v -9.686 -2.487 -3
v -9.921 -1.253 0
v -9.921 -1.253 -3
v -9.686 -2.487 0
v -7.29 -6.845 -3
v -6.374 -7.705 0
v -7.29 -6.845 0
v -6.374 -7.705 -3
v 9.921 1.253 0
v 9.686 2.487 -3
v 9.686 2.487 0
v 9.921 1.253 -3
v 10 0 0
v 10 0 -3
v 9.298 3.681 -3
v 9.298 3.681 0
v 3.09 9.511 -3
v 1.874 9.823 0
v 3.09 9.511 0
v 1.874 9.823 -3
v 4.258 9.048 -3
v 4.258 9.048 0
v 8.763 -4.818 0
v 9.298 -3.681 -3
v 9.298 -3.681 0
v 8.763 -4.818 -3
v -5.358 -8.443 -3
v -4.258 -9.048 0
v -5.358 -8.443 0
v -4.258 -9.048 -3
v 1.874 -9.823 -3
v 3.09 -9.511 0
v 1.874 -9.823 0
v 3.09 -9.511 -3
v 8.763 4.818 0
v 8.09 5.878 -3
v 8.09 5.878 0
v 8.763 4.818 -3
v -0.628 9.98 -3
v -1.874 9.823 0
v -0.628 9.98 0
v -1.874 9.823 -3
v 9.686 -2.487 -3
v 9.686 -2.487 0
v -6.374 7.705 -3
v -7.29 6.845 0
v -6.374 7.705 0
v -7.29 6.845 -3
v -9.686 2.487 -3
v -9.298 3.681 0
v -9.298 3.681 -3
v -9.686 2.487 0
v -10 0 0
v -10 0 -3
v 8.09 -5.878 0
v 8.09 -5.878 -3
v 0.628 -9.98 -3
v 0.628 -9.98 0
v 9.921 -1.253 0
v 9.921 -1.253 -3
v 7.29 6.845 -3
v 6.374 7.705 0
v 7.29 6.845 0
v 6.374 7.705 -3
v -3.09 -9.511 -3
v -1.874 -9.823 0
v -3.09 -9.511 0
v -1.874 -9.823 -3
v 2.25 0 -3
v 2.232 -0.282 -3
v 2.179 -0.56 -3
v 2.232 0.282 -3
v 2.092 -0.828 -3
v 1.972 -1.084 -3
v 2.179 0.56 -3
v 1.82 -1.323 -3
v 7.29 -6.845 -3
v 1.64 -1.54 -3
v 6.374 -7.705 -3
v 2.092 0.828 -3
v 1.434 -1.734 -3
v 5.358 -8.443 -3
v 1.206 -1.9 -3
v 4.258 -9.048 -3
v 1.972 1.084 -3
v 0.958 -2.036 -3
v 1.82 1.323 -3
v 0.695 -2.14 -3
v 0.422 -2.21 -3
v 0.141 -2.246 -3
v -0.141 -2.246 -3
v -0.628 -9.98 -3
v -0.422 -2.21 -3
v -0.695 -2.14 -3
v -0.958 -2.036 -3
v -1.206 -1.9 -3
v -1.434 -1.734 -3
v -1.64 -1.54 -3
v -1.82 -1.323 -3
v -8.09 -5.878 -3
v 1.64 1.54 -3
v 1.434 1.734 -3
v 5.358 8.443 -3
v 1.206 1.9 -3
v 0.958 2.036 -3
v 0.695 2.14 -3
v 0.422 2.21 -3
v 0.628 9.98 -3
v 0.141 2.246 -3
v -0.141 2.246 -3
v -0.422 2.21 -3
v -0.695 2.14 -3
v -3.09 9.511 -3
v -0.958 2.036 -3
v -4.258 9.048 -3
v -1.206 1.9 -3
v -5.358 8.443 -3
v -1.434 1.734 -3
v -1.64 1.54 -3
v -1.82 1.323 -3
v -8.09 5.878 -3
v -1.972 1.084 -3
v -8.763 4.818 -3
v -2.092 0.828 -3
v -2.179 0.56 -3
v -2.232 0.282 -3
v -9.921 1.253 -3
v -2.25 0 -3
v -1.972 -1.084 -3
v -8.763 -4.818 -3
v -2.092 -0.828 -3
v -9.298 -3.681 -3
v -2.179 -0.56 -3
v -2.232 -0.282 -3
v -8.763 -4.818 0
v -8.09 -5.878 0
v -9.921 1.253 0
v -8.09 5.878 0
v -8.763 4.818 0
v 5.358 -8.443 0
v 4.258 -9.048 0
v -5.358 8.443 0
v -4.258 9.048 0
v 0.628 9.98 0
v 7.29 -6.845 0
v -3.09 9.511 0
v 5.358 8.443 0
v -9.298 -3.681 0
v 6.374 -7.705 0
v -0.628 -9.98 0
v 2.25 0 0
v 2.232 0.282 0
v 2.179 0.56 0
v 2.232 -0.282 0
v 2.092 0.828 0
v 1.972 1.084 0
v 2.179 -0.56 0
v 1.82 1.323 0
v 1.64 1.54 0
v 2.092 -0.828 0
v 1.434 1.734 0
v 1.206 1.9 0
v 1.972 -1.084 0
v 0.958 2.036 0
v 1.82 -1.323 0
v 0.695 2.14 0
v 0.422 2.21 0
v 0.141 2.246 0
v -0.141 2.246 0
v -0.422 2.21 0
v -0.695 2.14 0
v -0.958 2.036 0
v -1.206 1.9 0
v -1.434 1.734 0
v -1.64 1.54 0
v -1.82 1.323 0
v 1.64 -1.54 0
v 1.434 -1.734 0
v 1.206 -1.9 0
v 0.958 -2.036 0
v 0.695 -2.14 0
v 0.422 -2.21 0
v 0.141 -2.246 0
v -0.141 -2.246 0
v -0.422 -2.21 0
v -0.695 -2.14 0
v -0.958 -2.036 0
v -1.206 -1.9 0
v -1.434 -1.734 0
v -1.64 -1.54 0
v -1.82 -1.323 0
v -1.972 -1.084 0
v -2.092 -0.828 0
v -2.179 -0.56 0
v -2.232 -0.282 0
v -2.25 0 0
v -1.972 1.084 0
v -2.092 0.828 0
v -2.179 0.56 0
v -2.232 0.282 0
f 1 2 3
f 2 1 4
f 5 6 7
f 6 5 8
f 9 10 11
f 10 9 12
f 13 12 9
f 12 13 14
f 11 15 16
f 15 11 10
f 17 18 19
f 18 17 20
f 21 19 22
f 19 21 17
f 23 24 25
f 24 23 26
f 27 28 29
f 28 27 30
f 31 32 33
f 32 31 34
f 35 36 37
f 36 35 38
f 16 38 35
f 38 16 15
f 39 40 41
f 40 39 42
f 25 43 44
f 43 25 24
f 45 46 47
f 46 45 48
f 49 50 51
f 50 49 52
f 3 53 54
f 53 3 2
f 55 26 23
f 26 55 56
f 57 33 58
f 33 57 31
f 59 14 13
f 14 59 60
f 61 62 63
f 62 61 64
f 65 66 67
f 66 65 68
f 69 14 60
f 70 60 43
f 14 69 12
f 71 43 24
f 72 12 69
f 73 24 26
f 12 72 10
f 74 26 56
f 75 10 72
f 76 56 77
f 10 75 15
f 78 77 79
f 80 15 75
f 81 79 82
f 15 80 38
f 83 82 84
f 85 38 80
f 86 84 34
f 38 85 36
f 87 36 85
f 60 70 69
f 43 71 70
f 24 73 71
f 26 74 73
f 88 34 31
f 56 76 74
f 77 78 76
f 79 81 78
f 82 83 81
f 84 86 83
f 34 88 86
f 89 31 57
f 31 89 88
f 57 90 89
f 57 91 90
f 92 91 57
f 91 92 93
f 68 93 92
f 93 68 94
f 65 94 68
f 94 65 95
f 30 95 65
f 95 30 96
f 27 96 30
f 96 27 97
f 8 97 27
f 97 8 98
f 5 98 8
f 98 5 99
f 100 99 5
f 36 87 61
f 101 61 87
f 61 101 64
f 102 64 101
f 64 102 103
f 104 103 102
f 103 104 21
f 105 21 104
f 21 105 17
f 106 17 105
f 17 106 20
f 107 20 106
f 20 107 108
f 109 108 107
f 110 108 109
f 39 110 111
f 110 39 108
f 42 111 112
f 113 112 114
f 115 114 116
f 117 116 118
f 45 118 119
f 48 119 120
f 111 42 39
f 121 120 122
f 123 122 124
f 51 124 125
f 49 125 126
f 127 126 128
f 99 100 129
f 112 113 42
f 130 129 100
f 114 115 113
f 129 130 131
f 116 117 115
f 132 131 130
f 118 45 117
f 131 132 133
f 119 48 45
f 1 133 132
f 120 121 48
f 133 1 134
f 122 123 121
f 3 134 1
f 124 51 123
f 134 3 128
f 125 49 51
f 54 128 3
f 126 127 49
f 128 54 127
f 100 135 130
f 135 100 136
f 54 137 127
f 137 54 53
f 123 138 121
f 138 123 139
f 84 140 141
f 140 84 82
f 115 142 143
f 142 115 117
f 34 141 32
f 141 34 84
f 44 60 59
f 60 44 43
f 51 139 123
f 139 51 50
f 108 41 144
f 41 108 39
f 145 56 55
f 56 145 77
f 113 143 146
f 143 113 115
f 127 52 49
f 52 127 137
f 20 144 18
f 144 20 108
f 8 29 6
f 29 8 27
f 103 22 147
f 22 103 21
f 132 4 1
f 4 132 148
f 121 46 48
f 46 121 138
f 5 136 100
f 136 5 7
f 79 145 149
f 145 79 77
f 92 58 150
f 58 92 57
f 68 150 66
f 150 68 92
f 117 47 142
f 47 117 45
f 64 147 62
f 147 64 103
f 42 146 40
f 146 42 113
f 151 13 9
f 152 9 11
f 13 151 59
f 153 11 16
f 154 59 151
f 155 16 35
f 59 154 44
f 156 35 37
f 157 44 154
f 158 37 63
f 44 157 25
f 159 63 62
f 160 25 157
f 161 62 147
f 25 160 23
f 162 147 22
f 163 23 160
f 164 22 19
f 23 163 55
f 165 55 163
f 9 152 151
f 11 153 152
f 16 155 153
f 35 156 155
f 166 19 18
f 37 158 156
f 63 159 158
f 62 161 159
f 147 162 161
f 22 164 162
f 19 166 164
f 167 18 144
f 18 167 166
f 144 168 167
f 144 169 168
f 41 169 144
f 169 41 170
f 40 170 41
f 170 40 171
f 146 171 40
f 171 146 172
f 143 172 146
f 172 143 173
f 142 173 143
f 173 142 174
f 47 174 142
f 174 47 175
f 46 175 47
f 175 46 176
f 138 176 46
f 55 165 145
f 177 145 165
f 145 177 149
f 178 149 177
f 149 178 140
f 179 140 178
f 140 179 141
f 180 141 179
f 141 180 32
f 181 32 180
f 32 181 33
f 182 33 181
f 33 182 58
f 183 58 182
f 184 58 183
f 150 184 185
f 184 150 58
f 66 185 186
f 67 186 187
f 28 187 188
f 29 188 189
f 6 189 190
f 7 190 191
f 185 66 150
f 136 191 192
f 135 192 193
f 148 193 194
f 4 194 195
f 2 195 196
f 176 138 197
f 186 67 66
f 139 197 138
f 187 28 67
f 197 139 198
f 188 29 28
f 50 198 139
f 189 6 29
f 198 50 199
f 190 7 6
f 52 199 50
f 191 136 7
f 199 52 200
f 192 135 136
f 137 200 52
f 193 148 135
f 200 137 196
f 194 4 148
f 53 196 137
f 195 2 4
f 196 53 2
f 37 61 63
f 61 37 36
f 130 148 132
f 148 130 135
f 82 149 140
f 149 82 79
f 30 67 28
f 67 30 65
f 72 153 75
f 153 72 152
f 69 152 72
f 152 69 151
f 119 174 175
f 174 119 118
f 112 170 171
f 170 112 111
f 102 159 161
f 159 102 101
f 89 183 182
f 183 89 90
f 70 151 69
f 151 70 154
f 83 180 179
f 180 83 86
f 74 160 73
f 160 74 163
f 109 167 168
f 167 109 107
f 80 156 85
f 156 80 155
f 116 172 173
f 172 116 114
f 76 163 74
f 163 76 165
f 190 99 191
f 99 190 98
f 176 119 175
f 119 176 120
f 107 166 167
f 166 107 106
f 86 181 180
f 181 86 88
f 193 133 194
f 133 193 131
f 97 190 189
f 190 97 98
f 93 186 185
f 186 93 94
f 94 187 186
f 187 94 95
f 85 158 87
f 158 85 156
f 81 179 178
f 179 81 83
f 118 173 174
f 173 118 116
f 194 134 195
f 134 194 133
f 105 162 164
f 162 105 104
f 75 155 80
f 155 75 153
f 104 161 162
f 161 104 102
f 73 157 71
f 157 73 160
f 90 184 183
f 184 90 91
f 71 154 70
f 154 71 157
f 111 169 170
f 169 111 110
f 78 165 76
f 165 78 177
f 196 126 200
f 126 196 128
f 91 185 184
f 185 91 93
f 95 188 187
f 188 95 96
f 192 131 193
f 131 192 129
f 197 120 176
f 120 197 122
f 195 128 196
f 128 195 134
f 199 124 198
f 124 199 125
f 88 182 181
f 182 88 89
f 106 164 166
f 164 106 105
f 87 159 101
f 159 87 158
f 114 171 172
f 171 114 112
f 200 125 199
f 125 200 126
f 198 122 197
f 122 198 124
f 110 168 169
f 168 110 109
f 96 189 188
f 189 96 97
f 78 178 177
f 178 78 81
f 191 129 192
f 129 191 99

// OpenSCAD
$fn = 50;


difference() {
	union() {
		translate(v = [0, 0, -3.0000000000]) {
			cylinder(h = 3, r = 10.0000000000);
		}
	}
	union() {
		#translate(v = [0, 0, -3]) {
			cylinder(h = 3, r = 2.2500000000);
		}
	}
}
